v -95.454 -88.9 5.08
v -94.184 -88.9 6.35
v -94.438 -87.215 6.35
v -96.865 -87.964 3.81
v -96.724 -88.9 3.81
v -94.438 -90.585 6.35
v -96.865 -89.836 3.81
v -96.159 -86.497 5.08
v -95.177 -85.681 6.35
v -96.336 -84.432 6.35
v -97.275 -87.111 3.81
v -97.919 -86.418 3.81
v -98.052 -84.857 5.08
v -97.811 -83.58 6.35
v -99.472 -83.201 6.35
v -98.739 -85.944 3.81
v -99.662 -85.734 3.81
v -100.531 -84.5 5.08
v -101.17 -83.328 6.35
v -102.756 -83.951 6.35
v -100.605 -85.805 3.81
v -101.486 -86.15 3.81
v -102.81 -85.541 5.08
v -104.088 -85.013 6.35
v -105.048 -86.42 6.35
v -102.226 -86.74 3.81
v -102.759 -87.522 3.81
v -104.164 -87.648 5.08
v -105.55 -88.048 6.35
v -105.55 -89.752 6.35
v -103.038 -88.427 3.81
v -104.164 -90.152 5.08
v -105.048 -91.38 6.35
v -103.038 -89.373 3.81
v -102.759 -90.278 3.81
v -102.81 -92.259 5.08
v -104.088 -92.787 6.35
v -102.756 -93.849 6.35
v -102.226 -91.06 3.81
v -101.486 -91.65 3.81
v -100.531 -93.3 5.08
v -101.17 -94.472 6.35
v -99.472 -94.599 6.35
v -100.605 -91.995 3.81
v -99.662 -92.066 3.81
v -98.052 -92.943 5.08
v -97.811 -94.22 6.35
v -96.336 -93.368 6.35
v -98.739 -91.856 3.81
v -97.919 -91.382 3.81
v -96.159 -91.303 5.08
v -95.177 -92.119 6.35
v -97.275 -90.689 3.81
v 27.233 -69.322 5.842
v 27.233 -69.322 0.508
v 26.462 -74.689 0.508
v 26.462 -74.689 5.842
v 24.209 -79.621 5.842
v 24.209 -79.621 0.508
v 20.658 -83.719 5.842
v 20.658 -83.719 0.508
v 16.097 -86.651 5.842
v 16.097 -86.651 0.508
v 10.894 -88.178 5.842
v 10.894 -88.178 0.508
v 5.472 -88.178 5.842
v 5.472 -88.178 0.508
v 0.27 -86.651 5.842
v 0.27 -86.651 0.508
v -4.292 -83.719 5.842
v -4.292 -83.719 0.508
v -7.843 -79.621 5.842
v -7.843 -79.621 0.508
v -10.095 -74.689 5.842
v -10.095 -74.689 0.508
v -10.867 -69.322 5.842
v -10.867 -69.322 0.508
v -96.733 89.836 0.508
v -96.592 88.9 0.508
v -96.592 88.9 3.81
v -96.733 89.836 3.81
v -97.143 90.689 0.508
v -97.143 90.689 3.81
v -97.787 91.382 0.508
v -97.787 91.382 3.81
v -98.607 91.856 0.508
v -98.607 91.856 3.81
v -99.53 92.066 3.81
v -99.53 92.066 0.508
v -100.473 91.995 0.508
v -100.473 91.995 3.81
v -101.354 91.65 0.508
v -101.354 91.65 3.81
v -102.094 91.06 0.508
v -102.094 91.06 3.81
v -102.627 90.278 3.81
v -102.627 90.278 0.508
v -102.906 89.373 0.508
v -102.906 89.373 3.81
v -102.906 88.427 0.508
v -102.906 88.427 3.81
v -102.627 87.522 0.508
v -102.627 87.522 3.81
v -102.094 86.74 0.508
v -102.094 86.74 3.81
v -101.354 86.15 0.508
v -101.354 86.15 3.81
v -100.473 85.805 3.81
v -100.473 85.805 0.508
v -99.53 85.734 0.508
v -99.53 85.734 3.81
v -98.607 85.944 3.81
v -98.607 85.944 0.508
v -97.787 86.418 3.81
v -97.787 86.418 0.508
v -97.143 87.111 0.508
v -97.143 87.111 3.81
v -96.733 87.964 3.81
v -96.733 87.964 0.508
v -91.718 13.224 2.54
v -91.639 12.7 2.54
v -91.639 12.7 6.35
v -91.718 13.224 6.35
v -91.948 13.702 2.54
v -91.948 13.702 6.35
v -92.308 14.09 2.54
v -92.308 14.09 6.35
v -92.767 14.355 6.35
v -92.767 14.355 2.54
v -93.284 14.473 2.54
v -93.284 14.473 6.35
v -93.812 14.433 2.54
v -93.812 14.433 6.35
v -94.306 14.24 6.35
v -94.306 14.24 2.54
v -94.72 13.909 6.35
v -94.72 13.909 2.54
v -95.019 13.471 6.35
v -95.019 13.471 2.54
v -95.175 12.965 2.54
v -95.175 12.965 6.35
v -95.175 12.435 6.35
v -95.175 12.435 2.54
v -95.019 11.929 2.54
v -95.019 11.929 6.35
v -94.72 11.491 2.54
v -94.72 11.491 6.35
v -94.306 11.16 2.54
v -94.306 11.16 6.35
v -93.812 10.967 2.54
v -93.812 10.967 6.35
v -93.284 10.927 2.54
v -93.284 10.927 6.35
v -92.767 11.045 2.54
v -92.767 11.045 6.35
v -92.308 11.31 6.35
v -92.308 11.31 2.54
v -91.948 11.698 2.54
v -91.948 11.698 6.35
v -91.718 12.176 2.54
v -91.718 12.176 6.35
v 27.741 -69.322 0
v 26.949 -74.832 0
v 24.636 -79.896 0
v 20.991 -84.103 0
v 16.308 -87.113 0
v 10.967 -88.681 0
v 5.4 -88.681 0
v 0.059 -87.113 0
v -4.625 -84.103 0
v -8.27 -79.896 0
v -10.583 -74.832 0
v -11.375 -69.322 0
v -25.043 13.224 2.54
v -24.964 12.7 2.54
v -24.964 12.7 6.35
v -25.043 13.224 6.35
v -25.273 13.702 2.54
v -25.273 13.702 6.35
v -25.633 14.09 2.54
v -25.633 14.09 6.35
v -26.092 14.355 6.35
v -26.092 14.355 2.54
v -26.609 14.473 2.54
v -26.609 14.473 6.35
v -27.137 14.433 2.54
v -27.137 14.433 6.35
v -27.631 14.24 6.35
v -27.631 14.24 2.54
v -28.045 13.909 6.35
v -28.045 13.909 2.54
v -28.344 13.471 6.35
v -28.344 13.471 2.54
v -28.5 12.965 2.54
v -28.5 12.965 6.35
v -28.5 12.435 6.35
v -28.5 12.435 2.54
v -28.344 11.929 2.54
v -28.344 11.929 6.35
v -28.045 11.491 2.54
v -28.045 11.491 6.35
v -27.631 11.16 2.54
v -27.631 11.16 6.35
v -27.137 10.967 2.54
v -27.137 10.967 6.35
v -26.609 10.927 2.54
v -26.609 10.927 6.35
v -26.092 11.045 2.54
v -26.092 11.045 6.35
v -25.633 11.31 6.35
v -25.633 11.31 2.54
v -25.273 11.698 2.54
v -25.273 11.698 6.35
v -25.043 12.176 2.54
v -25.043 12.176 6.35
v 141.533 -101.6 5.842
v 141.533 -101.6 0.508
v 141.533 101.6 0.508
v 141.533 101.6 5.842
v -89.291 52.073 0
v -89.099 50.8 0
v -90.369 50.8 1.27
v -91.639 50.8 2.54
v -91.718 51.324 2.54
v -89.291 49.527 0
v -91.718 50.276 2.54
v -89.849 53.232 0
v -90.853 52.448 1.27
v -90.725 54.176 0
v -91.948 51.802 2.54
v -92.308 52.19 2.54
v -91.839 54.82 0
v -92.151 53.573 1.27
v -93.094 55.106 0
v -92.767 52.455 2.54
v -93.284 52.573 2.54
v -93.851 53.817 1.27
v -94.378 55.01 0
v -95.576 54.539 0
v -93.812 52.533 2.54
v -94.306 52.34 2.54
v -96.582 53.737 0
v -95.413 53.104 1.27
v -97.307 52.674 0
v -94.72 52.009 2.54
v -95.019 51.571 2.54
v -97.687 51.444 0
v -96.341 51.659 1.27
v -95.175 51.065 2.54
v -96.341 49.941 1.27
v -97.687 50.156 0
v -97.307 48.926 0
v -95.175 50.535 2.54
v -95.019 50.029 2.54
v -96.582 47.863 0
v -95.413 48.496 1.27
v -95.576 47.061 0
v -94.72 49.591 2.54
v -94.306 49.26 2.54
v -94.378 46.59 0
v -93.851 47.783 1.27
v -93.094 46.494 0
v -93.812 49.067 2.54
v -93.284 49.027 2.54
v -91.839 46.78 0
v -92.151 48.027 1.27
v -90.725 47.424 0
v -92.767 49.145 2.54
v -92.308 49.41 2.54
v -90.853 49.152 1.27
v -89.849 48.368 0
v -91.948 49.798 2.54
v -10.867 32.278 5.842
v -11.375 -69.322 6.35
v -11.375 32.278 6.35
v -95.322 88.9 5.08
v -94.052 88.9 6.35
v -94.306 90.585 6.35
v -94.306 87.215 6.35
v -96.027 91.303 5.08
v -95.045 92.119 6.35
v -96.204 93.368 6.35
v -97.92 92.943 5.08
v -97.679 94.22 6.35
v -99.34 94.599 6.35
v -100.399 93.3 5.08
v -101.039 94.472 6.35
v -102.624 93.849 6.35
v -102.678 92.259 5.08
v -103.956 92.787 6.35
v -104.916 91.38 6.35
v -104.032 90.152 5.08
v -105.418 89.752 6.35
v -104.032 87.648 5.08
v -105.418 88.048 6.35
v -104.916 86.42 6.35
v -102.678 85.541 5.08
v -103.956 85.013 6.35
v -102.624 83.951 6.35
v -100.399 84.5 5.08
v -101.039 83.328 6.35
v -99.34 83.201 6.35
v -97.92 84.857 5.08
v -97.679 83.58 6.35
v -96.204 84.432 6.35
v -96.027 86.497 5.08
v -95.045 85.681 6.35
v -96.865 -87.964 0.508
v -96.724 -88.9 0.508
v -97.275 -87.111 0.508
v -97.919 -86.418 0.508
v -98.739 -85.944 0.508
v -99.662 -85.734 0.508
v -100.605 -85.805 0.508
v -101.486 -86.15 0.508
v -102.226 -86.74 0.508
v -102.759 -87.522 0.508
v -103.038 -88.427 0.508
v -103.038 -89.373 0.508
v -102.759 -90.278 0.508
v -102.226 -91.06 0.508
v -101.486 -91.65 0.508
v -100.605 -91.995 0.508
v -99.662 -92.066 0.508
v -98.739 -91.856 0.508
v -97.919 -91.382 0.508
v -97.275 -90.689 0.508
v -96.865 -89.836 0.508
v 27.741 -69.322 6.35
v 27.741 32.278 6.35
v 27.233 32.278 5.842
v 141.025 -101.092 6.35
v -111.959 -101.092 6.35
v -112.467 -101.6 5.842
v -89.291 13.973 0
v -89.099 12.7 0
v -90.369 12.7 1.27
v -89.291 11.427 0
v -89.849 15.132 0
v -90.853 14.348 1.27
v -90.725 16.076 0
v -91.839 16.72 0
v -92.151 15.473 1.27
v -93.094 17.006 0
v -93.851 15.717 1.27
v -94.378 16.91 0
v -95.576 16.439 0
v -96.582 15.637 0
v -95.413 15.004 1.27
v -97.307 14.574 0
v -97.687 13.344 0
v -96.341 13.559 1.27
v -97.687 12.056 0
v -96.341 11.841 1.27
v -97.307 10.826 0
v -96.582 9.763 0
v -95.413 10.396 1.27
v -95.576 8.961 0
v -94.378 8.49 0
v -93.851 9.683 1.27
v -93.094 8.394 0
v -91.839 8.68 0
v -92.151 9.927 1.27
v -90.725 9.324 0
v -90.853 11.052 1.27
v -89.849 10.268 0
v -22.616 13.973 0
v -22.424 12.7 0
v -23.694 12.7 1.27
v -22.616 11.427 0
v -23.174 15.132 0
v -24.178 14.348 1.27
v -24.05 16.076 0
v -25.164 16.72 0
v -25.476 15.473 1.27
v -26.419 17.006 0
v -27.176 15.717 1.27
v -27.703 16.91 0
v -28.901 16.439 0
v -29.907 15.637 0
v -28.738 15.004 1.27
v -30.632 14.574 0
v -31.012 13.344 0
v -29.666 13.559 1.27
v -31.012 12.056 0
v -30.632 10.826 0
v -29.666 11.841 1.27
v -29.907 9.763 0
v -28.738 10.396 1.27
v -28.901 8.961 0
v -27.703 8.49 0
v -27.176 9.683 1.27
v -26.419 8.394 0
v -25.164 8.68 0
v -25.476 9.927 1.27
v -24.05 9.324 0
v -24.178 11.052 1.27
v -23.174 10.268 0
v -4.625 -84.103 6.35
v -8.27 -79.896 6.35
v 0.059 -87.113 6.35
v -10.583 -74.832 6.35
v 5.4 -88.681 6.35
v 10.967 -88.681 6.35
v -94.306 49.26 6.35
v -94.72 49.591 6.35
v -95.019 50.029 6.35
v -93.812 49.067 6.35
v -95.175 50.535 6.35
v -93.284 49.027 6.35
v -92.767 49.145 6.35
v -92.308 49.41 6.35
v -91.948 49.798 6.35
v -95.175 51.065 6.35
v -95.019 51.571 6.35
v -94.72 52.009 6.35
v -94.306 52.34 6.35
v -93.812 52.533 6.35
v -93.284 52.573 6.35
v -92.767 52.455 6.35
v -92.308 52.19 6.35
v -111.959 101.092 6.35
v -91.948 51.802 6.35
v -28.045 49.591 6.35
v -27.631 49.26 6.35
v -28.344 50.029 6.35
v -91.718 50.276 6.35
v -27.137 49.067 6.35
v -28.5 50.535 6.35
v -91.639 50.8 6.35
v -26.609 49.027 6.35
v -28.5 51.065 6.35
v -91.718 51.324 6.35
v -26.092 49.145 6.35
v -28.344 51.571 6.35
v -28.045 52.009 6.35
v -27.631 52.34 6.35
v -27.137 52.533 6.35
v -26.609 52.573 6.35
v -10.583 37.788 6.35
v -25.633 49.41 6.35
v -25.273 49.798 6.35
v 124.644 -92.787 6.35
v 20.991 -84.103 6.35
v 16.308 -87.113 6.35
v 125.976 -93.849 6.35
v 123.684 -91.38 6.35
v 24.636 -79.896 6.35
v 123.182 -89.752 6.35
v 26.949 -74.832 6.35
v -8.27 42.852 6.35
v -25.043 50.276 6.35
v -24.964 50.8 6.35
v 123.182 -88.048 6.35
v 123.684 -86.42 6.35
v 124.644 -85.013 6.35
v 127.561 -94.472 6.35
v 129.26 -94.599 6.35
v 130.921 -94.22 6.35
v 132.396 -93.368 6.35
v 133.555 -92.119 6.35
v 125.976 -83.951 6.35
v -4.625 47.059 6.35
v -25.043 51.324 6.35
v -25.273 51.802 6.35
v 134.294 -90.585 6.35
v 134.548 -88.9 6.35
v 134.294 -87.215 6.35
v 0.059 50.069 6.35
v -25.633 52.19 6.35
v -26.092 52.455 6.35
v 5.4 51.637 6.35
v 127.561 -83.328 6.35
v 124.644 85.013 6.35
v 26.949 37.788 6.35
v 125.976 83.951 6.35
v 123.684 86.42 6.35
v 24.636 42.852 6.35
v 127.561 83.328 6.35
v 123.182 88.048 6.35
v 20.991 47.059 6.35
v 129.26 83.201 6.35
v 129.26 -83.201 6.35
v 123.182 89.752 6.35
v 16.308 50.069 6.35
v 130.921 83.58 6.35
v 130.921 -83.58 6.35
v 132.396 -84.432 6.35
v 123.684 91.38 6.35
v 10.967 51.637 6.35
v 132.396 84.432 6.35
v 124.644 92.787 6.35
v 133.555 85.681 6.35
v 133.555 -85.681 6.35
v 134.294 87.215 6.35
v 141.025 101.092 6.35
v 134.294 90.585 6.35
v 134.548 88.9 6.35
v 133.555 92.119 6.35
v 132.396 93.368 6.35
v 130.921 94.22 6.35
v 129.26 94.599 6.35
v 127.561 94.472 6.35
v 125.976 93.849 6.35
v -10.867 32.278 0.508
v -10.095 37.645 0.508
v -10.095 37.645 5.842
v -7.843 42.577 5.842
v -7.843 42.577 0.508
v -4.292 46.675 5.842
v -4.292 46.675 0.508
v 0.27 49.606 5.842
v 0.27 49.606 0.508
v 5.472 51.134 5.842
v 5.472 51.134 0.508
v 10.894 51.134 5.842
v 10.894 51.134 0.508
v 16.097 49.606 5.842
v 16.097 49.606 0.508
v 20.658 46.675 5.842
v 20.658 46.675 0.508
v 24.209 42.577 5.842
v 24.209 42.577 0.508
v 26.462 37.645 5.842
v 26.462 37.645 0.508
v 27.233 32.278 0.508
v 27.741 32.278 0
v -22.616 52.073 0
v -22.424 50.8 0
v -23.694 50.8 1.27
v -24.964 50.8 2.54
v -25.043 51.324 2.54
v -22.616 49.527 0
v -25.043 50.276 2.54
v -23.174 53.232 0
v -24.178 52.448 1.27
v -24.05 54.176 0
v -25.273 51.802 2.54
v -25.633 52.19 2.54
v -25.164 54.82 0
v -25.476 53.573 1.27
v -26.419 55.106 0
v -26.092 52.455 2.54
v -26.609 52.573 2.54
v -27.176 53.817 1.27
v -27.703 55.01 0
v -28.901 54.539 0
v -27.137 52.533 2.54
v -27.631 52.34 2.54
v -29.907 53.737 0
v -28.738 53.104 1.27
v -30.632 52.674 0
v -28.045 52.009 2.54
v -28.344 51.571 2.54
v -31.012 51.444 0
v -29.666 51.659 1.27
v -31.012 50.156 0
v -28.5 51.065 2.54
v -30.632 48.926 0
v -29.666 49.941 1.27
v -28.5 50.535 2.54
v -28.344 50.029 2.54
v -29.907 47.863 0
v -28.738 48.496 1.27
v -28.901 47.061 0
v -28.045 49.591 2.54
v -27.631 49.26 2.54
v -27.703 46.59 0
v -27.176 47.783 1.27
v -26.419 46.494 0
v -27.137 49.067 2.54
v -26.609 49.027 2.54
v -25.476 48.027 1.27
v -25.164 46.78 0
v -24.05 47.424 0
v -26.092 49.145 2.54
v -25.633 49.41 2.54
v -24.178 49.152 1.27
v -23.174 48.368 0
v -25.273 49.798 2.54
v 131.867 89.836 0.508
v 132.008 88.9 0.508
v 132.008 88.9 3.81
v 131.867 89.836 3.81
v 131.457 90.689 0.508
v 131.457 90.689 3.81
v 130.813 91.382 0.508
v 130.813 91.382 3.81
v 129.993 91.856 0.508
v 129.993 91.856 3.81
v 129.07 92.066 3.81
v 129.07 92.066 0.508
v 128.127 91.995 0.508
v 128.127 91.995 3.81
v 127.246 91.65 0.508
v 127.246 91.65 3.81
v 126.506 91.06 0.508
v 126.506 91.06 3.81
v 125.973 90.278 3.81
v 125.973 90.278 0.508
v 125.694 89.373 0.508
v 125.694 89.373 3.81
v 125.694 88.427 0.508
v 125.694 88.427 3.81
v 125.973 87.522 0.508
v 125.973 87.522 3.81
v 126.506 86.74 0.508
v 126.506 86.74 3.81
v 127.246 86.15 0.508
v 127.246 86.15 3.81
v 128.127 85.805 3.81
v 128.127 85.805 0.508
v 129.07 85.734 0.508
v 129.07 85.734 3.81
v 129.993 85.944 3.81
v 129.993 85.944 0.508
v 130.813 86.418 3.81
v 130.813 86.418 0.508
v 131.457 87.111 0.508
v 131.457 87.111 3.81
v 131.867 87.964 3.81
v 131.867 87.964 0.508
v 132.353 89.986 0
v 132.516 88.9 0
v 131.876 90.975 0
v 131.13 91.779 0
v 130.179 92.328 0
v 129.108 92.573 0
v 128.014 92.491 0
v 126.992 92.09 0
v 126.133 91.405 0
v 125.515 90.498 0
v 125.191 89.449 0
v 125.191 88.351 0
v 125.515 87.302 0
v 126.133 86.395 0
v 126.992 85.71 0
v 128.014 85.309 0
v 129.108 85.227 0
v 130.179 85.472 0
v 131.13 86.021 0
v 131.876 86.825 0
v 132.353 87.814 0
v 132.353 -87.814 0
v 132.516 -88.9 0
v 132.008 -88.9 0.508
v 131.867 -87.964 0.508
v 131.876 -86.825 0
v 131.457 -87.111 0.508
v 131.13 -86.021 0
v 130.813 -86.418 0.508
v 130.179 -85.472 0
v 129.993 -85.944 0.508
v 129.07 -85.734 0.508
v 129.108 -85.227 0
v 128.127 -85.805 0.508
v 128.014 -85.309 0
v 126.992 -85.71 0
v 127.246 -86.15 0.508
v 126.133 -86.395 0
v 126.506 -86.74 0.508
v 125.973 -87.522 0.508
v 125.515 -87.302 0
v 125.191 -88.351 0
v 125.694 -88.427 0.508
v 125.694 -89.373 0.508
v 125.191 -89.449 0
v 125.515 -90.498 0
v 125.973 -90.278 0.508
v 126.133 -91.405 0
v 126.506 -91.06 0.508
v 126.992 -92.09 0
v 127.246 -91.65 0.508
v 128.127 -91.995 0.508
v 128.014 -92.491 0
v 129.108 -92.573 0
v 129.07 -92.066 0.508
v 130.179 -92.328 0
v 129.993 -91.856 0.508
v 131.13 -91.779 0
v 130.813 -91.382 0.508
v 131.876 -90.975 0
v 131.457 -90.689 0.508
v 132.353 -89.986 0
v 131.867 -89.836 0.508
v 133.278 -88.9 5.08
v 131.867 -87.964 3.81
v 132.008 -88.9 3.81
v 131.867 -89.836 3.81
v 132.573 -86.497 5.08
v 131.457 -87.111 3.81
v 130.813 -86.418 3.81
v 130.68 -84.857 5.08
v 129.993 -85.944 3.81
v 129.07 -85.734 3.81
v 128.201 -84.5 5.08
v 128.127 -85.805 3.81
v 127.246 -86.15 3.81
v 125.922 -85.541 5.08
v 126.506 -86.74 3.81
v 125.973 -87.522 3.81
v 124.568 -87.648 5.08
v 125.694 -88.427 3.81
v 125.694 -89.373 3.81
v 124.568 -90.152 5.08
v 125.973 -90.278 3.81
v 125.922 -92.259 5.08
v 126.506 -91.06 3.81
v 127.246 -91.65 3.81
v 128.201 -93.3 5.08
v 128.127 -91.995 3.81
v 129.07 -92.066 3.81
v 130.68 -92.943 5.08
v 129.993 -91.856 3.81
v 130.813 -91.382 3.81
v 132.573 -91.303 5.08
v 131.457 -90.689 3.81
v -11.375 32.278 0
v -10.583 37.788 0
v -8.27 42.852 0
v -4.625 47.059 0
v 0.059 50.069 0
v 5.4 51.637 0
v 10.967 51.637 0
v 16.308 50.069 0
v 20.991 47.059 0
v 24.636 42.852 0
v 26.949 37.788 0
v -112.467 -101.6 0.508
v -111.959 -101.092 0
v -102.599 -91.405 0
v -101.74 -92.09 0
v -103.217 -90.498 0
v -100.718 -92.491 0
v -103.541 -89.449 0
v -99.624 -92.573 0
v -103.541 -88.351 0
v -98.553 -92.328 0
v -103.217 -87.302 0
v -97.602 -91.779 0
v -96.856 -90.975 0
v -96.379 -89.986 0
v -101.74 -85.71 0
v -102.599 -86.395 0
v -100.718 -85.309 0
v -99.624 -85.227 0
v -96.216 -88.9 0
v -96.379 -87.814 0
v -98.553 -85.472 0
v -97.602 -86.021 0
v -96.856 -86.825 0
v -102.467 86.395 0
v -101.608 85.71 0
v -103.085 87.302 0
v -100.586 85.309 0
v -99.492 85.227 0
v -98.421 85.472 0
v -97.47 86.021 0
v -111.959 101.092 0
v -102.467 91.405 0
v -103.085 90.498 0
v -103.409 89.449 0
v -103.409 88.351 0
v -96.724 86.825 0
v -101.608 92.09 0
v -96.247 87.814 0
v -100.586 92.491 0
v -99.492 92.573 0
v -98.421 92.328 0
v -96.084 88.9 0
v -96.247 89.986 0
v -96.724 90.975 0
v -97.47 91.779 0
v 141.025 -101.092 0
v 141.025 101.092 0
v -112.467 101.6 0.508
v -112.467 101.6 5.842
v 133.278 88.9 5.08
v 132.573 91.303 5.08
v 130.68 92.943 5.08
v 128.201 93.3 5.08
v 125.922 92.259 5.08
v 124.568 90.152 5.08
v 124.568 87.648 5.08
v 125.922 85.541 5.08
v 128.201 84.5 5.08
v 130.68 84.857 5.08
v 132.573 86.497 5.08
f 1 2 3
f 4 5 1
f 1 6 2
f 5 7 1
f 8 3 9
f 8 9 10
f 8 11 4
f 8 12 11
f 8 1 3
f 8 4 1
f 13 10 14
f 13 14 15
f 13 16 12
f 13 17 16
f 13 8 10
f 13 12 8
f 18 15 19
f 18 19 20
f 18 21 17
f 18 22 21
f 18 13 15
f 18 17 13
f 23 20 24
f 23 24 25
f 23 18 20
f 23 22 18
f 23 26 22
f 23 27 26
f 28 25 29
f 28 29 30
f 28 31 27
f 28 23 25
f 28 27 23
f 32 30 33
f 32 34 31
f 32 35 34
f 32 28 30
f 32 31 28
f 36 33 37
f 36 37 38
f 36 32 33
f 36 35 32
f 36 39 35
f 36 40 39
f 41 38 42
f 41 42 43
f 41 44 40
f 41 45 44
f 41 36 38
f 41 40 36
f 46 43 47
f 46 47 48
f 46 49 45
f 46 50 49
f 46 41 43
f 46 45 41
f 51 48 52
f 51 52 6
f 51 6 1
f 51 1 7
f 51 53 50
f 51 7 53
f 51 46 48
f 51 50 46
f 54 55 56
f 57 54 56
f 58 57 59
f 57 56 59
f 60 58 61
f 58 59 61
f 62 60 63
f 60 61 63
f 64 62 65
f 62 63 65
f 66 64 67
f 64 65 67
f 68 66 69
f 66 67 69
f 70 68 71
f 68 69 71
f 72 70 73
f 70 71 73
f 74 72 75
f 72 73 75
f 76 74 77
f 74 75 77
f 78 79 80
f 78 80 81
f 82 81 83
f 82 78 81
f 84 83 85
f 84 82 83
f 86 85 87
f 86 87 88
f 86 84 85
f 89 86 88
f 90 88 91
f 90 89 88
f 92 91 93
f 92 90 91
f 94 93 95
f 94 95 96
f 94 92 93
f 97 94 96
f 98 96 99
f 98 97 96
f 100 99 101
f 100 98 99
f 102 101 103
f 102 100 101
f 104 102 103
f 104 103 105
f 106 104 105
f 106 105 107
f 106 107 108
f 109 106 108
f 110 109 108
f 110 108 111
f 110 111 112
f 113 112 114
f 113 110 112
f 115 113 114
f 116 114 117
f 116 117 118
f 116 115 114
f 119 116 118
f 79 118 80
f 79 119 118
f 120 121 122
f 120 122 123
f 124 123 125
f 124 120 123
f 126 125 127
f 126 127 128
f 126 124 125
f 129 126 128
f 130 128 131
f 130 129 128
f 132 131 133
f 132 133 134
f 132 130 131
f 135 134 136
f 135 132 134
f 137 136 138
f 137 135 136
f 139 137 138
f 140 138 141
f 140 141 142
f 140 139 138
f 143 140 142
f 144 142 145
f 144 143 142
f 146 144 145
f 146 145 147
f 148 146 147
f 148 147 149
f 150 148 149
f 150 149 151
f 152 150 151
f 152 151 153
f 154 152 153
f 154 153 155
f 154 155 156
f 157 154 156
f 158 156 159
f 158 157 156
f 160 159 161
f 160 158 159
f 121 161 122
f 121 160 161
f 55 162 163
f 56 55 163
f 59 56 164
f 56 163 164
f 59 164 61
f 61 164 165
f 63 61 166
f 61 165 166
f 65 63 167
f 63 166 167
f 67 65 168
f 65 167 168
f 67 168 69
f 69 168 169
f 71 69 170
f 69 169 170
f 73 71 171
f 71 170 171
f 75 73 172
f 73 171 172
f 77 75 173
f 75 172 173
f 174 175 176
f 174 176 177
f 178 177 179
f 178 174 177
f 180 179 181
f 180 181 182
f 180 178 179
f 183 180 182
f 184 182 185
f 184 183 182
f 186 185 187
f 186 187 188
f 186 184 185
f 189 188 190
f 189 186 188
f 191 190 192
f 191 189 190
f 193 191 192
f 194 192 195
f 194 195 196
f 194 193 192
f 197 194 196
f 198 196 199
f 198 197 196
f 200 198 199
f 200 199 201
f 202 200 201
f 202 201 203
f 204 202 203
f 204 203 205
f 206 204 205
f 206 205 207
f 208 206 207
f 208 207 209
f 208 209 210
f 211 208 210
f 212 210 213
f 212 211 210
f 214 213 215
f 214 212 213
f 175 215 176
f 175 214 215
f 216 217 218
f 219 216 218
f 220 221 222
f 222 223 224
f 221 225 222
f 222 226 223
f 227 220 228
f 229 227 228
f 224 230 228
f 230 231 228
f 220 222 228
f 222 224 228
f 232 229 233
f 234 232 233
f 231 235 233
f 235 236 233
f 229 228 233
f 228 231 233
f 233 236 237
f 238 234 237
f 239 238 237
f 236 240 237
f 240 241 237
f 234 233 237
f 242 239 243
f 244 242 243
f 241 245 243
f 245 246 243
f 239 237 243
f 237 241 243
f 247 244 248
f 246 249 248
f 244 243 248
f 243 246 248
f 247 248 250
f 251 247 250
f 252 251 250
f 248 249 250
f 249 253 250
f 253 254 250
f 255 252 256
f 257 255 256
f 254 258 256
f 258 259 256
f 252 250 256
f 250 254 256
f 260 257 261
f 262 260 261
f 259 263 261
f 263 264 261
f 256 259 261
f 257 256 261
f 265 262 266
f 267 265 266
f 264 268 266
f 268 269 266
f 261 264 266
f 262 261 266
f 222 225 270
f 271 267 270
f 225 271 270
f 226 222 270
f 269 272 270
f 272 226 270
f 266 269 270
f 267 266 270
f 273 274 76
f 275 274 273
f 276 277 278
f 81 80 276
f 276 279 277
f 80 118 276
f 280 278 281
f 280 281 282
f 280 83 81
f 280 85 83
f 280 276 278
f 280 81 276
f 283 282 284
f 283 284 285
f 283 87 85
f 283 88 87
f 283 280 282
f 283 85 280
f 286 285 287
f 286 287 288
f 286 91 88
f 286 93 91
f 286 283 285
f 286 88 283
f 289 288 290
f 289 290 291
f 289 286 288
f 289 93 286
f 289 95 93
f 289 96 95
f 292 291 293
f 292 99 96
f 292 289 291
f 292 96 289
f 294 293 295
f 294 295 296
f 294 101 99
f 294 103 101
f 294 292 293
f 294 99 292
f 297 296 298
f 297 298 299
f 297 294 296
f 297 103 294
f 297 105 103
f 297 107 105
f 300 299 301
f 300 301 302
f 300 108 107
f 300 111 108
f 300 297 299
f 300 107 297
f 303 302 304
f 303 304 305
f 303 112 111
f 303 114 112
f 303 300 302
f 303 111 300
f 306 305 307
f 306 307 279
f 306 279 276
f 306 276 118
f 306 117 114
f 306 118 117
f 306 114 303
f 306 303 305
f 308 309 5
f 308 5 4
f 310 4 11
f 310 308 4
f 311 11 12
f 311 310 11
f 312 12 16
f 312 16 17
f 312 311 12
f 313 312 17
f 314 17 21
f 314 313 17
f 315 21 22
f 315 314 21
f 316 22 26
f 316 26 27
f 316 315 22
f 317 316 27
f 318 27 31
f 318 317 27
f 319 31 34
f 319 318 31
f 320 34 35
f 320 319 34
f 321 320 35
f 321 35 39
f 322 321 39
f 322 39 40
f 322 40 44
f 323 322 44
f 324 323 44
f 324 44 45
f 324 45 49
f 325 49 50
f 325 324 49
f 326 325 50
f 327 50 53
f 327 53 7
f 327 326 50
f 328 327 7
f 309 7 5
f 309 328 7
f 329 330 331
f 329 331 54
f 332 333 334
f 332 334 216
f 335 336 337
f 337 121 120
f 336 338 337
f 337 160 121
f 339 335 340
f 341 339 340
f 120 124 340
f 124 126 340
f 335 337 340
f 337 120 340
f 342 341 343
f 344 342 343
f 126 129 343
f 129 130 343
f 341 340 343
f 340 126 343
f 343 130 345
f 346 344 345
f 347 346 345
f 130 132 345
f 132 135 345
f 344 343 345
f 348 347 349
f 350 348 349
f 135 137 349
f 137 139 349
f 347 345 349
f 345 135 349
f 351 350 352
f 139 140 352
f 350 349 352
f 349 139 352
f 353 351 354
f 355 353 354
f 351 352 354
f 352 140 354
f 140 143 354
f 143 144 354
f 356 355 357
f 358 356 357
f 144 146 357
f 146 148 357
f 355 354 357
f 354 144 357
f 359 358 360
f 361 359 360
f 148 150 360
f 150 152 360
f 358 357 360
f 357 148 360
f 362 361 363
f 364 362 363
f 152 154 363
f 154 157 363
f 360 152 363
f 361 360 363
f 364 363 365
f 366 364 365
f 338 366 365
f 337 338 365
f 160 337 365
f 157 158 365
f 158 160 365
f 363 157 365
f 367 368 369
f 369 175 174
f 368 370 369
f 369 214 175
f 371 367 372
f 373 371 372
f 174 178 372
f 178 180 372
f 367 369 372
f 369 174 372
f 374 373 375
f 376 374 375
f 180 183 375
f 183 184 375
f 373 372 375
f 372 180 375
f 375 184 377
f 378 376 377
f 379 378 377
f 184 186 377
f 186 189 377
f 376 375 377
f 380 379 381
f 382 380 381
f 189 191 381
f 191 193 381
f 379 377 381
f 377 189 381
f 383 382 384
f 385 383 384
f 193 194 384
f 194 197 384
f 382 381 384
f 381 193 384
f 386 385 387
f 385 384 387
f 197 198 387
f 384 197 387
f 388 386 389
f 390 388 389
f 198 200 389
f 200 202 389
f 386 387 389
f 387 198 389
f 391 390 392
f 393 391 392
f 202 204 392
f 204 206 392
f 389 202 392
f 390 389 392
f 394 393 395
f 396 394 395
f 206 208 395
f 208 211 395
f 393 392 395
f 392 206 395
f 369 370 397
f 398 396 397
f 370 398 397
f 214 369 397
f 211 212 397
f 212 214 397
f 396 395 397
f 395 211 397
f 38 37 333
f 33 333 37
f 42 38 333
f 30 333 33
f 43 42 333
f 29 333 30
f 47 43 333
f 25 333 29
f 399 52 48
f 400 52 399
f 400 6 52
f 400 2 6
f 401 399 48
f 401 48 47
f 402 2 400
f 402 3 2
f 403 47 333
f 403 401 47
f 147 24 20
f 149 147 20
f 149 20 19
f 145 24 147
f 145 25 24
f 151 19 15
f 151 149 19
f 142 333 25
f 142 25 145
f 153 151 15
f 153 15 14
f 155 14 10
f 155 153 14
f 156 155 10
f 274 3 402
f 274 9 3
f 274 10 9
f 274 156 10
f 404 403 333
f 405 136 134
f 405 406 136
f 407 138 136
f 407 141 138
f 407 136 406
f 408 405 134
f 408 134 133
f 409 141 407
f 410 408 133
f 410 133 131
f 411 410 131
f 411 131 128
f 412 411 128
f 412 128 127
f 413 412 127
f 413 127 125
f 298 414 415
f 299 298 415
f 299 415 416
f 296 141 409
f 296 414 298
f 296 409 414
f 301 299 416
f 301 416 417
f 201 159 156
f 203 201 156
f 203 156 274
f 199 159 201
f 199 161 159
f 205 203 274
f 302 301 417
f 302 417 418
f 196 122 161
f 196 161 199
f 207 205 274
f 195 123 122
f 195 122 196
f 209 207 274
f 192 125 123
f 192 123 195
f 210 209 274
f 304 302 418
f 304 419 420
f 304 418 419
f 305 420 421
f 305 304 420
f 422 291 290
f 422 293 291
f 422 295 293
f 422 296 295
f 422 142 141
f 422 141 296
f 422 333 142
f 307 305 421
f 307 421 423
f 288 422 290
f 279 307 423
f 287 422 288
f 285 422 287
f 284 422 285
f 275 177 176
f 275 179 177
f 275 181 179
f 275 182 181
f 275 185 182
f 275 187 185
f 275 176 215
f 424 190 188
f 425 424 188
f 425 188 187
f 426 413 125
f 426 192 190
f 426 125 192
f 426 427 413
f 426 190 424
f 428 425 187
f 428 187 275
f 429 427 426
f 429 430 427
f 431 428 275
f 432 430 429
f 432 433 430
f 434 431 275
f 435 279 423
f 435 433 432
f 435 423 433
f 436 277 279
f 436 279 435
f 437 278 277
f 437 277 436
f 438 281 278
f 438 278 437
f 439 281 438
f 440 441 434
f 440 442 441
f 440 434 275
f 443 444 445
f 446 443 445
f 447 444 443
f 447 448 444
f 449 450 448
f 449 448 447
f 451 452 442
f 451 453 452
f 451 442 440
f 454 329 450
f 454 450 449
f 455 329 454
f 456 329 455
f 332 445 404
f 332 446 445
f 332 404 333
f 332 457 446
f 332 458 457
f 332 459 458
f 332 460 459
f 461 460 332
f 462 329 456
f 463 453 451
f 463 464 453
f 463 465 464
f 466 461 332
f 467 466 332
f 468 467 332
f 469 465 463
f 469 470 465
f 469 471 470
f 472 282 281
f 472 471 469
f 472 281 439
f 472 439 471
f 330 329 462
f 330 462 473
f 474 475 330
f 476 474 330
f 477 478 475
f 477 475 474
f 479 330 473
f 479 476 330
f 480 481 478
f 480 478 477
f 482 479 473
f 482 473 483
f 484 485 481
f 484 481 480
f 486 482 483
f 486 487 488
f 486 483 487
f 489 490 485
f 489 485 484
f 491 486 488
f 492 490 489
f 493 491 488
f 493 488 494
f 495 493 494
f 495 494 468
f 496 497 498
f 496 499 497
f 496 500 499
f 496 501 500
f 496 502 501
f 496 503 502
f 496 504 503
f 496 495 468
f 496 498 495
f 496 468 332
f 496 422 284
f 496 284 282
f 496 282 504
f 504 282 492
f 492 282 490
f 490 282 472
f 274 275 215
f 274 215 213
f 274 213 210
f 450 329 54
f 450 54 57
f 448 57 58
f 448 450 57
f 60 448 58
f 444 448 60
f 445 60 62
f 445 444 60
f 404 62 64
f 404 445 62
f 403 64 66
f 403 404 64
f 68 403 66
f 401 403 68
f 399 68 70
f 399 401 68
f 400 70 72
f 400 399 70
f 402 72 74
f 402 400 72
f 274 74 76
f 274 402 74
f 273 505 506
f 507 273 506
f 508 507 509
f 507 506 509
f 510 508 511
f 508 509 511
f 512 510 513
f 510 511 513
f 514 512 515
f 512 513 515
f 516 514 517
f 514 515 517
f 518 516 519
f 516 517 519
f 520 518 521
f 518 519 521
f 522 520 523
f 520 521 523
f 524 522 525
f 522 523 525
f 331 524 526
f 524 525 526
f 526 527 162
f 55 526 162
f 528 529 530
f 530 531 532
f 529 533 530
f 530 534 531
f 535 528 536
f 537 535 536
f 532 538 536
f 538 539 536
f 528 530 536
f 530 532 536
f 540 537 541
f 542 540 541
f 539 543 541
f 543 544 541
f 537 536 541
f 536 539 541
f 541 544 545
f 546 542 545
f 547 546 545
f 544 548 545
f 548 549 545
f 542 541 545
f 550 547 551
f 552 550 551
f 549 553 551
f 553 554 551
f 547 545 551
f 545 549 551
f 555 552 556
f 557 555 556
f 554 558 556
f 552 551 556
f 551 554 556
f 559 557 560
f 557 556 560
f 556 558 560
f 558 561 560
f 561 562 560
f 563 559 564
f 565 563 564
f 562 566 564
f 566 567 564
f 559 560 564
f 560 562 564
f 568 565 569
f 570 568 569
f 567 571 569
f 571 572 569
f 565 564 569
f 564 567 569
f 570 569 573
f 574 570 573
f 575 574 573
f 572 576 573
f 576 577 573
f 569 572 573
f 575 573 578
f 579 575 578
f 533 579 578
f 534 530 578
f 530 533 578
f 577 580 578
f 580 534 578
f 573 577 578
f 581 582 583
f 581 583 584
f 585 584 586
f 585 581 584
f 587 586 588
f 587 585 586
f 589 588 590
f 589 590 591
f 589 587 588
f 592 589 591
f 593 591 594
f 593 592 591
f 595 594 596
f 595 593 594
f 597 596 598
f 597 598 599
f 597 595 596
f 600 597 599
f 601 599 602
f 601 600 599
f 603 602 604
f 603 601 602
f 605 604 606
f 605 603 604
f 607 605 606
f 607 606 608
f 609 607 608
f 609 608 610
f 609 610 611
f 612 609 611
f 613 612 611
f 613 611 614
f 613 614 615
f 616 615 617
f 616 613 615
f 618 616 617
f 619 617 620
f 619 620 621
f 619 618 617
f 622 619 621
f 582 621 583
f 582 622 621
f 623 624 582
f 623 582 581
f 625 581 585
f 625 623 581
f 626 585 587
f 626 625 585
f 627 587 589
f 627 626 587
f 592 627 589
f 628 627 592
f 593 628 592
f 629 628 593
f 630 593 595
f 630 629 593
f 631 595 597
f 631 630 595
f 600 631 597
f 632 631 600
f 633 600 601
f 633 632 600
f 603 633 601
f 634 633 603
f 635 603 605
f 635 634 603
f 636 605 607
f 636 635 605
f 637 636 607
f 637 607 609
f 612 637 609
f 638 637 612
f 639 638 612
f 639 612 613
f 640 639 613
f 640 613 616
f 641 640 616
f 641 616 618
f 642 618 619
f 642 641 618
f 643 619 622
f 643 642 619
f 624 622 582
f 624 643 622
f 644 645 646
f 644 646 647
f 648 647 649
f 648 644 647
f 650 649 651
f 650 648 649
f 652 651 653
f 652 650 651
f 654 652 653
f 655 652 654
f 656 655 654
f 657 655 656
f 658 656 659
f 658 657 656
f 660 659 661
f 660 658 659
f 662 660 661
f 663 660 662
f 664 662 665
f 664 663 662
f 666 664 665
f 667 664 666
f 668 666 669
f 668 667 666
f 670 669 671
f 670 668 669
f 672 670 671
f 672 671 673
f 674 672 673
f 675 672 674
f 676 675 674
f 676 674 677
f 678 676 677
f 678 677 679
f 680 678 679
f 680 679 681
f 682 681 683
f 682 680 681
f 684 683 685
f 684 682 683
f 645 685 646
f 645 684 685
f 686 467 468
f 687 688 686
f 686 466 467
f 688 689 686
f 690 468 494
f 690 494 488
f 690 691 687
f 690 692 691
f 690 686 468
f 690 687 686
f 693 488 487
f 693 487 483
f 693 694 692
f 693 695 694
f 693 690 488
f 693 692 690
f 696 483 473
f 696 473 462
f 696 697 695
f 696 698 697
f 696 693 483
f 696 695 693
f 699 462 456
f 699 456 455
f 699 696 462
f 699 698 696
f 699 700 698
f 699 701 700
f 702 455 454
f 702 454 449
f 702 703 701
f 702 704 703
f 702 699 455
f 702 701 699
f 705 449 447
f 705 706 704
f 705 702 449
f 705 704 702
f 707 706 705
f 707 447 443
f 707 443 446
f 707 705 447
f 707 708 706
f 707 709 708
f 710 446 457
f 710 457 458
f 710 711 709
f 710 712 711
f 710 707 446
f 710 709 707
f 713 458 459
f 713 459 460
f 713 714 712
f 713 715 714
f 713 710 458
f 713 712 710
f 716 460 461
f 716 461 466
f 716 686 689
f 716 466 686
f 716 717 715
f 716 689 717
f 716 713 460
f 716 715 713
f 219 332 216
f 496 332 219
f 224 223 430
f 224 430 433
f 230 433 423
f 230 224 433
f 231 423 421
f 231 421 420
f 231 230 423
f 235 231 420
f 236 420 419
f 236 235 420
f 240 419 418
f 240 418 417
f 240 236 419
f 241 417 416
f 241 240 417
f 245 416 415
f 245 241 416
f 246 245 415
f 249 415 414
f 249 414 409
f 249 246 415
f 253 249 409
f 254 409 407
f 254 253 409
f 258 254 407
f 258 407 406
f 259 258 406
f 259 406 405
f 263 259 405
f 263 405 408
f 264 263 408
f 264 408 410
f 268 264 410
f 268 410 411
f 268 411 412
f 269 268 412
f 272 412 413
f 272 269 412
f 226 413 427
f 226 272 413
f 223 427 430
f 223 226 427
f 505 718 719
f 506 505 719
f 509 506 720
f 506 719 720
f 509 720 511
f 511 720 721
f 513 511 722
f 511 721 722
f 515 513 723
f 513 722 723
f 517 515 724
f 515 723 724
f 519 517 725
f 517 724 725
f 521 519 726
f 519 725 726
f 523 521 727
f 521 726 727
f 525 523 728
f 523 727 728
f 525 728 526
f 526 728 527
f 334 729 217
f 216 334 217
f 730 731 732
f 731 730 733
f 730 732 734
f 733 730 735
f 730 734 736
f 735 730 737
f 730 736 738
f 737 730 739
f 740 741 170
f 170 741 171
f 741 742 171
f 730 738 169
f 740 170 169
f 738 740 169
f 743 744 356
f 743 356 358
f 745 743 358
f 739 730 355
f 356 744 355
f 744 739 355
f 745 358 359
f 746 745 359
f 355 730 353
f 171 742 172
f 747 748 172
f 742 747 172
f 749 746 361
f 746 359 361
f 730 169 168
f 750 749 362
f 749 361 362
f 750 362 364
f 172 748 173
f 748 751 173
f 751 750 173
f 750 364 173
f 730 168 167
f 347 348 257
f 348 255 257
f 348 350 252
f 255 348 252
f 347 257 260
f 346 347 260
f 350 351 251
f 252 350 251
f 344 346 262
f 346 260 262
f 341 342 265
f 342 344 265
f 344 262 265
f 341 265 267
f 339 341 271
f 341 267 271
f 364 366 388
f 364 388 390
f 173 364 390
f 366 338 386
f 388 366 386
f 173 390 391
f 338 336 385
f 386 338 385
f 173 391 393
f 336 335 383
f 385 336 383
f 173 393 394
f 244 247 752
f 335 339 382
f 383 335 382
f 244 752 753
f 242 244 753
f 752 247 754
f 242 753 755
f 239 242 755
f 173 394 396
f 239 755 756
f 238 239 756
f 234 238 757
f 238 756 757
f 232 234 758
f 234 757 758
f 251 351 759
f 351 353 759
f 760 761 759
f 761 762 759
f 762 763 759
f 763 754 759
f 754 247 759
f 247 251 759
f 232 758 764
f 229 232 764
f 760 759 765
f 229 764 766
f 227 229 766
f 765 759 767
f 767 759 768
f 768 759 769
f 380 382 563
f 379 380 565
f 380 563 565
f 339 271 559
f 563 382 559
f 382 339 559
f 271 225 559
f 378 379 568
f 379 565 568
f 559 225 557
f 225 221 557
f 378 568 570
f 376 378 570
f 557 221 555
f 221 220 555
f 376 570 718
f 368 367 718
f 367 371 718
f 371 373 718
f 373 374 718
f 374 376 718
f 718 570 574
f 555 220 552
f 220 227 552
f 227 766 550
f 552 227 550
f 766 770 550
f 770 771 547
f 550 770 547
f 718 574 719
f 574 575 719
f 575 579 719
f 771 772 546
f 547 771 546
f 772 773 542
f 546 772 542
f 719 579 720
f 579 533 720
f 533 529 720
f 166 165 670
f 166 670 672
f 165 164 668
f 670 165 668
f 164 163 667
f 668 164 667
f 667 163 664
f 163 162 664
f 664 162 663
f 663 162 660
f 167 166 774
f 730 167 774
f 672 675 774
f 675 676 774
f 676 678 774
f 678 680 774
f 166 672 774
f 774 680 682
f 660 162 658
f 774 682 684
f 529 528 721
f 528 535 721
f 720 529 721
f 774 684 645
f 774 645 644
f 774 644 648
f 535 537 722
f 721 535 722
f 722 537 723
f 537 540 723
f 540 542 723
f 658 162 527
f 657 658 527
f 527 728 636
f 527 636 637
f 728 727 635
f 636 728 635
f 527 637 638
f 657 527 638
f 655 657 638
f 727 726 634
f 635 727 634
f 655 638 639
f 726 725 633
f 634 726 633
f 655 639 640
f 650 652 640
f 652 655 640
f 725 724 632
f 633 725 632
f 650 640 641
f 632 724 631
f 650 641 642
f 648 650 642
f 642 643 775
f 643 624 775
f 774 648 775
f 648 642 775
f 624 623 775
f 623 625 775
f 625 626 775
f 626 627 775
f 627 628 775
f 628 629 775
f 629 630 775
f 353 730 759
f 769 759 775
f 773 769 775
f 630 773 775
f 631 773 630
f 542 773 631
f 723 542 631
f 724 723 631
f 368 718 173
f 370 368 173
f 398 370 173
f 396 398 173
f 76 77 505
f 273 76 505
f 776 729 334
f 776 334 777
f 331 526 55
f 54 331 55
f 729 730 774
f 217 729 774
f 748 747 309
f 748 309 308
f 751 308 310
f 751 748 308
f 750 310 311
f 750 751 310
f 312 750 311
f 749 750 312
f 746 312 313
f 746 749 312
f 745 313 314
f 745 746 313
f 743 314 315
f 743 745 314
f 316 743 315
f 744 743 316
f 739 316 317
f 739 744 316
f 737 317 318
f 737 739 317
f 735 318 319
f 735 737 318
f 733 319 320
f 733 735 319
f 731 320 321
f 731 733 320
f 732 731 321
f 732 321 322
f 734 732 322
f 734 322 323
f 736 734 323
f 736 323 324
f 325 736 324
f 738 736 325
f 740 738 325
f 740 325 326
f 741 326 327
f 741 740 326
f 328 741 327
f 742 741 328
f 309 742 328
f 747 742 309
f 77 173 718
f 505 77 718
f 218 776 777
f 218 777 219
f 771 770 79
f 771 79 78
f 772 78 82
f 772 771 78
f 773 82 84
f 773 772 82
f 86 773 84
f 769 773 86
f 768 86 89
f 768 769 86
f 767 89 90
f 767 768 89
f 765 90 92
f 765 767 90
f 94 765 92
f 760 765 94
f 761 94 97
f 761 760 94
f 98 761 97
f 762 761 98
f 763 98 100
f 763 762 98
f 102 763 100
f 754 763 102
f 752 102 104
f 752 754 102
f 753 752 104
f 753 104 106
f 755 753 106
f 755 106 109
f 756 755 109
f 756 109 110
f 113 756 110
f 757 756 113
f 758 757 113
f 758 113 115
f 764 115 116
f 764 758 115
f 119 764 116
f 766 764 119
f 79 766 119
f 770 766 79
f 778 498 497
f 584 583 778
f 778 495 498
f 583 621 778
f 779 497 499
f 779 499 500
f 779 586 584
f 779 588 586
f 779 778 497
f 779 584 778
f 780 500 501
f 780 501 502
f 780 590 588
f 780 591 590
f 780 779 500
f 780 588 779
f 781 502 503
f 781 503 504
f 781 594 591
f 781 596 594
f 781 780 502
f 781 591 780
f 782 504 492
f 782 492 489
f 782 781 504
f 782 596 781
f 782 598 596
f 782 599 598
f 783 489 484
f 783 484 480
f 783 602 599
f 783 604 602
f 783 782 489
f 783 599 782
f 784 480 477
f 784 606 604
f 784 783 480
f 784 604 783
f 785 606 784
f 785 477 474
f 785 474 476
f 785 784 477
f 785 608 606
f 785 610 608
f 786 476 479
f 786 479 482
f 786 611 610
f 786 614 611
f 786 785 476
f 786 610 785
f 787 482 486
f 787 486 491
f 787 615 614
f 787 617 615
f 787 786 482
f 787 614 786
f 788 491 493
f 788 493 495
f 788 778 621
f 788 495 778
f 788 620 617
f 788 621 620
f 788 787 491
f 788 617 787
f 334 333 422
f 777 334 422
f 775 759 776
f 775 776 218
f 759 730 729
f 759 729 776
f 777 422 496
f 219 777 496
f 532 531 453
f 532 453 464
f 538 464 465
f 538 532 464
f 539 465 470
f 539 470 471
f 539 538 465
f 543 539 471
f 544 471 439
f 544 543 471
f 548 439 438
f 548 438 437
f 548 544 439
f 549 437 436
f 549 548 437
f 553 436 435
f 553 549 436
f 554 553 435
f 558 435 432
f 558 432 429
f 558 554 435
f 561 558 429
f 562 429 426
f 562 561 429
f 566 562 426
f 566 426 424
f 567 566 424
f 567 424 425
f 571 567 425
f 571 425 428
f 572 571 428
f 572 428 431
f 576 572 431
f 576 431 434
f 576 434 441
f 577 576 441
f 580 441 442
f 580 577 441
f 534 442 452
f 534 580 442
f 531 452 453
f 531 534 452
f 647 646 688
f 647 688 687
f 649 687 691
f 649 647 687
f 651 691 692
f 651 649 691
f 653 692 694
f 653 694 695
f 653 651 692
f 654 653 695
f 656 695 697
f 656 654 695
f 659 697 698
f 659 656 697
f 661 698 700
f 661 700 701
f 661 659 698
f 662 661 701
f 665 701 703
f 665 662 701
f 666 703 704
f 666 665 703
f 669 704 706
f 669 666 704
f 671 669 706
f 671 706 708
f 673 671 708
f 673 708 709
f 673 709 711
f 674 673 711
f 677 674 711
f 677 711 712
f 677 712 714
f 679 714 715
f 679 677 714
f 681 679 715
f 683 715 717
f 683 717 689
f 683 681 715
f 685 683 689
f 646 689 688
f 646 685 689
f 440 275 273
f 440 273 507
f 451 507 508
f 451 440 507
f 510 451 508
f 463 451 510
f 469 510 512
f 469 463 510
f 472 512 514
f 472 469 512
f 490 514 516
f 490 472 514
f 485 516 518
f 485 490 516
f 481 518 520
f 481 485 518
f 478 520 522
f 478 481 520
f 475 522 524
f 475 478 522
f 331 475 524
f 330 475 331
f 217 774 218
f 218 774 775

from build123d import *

# Parameters (mm, degrees)
F0_W     = 254
F0_H     = 203.2
F0_R     = 3.175
F0_R_2   = 1.778
F1_DEPTH = 6.35
F2_SIZE  = 0.508
F3_SIZE  = 2.54


with BuildPart() as f1:
    # F0 (on Top) → F1 (new body)
    with BuildSketch(Plane.XY):
        with Locations((14.533197, 0)):
            Rectangle(F0_W, F0_H)
        with Locations((-99.898785, -88.9)):
            Circle(F0_R, mode=Mode.SUBTRACT)
        with BuildLine():
            ThreePointArc((27.233197, -69.322012), (8.183197, -88.372012), (-10.866803, -69.322012))
            Line((-10.866803, -69.322012), (-10.866803, 32.277988))
            ThreePointArc((-10.866803, 32.277988), (8.183197, 51.327988), (27.233197, 32.277988))
            Line((27.233197, 32.277988), (27.233197, -69.322012))
        make_face(mode=Mode.SUBTRACT)
        with Locations((128.833197, -88.9)):
            Circle(F0_R, mode=Mode.SUBTRACT)
        with Locations((-93.416854, 12.7)):
            Circle(F0_R_2, mode=Mode.SUBTRACT)
        with Locations((-93.416854, 50.8)):
            Circle(F0_R_2, mode=Mode.SUBTRACT)
        with Locations((-26.741854, 12.7)):
            Circle(F0_R_2, mode=Mode.SUBTRACT)
        with Locations((-26.741854, 50.8)):
            Circle(F0_R_2, mode=Mode.SUBTRACT)
        with Locations((-99.766803, 88.9)):
            Circle(F0_R, mode=Mode.SUBTRACT)
        with Locations((128.833197, 88.9)):
            Circle(F0_R, mode=Mode.SUBTRACT)
    extrude(amount=F1_DEPTH)

    # F2
    f2_edges = [f1.edges().sort_by_distance(p)[0] for p in [
        (141.533197, 0, 6.35),
        (14.533197, -101.6, 6.35),
        (14.533197, 101.6, 6.35),
        (-112.466803, 0, 6.35),
        (-112.466803, 0, 0),
        (14.533197, -101.6, 0),
        (141.533197, 0, 0),
        (14.533197, 101.6, 0),
        (-10.866803, -18.522012, 0),
        (-10.866803, -18.522012, 6.35),
        (-103.073785, -88.9, 0),
        (125.658197, -88.9, 0),
        (125.658197, 88.9, 0),
        (-102.941803, 88.9, 0),
    ]]
    chamfer(f2_edges, length=F2_SIZE)

    # F3
    f3_edges = [f1.edges().sort_by_distance(p)[0] for p in [
        (-102.941803, 88.9, 6.35),
        (-103.073785, -88.9, 6.35),
        (125.658197, 88.9, 6.35),
        (125.658197, -88.9, 6.35),
        (-95.194854, 12.7, 0),
        (-28.519854, 12.7, 0),
        (-28.519854, 50.8, 0),
        (-95.194854, 50.8, 0),
    ]]
    chamfer(f3_edges, length=F3_SIZE)


solid = f1.part
